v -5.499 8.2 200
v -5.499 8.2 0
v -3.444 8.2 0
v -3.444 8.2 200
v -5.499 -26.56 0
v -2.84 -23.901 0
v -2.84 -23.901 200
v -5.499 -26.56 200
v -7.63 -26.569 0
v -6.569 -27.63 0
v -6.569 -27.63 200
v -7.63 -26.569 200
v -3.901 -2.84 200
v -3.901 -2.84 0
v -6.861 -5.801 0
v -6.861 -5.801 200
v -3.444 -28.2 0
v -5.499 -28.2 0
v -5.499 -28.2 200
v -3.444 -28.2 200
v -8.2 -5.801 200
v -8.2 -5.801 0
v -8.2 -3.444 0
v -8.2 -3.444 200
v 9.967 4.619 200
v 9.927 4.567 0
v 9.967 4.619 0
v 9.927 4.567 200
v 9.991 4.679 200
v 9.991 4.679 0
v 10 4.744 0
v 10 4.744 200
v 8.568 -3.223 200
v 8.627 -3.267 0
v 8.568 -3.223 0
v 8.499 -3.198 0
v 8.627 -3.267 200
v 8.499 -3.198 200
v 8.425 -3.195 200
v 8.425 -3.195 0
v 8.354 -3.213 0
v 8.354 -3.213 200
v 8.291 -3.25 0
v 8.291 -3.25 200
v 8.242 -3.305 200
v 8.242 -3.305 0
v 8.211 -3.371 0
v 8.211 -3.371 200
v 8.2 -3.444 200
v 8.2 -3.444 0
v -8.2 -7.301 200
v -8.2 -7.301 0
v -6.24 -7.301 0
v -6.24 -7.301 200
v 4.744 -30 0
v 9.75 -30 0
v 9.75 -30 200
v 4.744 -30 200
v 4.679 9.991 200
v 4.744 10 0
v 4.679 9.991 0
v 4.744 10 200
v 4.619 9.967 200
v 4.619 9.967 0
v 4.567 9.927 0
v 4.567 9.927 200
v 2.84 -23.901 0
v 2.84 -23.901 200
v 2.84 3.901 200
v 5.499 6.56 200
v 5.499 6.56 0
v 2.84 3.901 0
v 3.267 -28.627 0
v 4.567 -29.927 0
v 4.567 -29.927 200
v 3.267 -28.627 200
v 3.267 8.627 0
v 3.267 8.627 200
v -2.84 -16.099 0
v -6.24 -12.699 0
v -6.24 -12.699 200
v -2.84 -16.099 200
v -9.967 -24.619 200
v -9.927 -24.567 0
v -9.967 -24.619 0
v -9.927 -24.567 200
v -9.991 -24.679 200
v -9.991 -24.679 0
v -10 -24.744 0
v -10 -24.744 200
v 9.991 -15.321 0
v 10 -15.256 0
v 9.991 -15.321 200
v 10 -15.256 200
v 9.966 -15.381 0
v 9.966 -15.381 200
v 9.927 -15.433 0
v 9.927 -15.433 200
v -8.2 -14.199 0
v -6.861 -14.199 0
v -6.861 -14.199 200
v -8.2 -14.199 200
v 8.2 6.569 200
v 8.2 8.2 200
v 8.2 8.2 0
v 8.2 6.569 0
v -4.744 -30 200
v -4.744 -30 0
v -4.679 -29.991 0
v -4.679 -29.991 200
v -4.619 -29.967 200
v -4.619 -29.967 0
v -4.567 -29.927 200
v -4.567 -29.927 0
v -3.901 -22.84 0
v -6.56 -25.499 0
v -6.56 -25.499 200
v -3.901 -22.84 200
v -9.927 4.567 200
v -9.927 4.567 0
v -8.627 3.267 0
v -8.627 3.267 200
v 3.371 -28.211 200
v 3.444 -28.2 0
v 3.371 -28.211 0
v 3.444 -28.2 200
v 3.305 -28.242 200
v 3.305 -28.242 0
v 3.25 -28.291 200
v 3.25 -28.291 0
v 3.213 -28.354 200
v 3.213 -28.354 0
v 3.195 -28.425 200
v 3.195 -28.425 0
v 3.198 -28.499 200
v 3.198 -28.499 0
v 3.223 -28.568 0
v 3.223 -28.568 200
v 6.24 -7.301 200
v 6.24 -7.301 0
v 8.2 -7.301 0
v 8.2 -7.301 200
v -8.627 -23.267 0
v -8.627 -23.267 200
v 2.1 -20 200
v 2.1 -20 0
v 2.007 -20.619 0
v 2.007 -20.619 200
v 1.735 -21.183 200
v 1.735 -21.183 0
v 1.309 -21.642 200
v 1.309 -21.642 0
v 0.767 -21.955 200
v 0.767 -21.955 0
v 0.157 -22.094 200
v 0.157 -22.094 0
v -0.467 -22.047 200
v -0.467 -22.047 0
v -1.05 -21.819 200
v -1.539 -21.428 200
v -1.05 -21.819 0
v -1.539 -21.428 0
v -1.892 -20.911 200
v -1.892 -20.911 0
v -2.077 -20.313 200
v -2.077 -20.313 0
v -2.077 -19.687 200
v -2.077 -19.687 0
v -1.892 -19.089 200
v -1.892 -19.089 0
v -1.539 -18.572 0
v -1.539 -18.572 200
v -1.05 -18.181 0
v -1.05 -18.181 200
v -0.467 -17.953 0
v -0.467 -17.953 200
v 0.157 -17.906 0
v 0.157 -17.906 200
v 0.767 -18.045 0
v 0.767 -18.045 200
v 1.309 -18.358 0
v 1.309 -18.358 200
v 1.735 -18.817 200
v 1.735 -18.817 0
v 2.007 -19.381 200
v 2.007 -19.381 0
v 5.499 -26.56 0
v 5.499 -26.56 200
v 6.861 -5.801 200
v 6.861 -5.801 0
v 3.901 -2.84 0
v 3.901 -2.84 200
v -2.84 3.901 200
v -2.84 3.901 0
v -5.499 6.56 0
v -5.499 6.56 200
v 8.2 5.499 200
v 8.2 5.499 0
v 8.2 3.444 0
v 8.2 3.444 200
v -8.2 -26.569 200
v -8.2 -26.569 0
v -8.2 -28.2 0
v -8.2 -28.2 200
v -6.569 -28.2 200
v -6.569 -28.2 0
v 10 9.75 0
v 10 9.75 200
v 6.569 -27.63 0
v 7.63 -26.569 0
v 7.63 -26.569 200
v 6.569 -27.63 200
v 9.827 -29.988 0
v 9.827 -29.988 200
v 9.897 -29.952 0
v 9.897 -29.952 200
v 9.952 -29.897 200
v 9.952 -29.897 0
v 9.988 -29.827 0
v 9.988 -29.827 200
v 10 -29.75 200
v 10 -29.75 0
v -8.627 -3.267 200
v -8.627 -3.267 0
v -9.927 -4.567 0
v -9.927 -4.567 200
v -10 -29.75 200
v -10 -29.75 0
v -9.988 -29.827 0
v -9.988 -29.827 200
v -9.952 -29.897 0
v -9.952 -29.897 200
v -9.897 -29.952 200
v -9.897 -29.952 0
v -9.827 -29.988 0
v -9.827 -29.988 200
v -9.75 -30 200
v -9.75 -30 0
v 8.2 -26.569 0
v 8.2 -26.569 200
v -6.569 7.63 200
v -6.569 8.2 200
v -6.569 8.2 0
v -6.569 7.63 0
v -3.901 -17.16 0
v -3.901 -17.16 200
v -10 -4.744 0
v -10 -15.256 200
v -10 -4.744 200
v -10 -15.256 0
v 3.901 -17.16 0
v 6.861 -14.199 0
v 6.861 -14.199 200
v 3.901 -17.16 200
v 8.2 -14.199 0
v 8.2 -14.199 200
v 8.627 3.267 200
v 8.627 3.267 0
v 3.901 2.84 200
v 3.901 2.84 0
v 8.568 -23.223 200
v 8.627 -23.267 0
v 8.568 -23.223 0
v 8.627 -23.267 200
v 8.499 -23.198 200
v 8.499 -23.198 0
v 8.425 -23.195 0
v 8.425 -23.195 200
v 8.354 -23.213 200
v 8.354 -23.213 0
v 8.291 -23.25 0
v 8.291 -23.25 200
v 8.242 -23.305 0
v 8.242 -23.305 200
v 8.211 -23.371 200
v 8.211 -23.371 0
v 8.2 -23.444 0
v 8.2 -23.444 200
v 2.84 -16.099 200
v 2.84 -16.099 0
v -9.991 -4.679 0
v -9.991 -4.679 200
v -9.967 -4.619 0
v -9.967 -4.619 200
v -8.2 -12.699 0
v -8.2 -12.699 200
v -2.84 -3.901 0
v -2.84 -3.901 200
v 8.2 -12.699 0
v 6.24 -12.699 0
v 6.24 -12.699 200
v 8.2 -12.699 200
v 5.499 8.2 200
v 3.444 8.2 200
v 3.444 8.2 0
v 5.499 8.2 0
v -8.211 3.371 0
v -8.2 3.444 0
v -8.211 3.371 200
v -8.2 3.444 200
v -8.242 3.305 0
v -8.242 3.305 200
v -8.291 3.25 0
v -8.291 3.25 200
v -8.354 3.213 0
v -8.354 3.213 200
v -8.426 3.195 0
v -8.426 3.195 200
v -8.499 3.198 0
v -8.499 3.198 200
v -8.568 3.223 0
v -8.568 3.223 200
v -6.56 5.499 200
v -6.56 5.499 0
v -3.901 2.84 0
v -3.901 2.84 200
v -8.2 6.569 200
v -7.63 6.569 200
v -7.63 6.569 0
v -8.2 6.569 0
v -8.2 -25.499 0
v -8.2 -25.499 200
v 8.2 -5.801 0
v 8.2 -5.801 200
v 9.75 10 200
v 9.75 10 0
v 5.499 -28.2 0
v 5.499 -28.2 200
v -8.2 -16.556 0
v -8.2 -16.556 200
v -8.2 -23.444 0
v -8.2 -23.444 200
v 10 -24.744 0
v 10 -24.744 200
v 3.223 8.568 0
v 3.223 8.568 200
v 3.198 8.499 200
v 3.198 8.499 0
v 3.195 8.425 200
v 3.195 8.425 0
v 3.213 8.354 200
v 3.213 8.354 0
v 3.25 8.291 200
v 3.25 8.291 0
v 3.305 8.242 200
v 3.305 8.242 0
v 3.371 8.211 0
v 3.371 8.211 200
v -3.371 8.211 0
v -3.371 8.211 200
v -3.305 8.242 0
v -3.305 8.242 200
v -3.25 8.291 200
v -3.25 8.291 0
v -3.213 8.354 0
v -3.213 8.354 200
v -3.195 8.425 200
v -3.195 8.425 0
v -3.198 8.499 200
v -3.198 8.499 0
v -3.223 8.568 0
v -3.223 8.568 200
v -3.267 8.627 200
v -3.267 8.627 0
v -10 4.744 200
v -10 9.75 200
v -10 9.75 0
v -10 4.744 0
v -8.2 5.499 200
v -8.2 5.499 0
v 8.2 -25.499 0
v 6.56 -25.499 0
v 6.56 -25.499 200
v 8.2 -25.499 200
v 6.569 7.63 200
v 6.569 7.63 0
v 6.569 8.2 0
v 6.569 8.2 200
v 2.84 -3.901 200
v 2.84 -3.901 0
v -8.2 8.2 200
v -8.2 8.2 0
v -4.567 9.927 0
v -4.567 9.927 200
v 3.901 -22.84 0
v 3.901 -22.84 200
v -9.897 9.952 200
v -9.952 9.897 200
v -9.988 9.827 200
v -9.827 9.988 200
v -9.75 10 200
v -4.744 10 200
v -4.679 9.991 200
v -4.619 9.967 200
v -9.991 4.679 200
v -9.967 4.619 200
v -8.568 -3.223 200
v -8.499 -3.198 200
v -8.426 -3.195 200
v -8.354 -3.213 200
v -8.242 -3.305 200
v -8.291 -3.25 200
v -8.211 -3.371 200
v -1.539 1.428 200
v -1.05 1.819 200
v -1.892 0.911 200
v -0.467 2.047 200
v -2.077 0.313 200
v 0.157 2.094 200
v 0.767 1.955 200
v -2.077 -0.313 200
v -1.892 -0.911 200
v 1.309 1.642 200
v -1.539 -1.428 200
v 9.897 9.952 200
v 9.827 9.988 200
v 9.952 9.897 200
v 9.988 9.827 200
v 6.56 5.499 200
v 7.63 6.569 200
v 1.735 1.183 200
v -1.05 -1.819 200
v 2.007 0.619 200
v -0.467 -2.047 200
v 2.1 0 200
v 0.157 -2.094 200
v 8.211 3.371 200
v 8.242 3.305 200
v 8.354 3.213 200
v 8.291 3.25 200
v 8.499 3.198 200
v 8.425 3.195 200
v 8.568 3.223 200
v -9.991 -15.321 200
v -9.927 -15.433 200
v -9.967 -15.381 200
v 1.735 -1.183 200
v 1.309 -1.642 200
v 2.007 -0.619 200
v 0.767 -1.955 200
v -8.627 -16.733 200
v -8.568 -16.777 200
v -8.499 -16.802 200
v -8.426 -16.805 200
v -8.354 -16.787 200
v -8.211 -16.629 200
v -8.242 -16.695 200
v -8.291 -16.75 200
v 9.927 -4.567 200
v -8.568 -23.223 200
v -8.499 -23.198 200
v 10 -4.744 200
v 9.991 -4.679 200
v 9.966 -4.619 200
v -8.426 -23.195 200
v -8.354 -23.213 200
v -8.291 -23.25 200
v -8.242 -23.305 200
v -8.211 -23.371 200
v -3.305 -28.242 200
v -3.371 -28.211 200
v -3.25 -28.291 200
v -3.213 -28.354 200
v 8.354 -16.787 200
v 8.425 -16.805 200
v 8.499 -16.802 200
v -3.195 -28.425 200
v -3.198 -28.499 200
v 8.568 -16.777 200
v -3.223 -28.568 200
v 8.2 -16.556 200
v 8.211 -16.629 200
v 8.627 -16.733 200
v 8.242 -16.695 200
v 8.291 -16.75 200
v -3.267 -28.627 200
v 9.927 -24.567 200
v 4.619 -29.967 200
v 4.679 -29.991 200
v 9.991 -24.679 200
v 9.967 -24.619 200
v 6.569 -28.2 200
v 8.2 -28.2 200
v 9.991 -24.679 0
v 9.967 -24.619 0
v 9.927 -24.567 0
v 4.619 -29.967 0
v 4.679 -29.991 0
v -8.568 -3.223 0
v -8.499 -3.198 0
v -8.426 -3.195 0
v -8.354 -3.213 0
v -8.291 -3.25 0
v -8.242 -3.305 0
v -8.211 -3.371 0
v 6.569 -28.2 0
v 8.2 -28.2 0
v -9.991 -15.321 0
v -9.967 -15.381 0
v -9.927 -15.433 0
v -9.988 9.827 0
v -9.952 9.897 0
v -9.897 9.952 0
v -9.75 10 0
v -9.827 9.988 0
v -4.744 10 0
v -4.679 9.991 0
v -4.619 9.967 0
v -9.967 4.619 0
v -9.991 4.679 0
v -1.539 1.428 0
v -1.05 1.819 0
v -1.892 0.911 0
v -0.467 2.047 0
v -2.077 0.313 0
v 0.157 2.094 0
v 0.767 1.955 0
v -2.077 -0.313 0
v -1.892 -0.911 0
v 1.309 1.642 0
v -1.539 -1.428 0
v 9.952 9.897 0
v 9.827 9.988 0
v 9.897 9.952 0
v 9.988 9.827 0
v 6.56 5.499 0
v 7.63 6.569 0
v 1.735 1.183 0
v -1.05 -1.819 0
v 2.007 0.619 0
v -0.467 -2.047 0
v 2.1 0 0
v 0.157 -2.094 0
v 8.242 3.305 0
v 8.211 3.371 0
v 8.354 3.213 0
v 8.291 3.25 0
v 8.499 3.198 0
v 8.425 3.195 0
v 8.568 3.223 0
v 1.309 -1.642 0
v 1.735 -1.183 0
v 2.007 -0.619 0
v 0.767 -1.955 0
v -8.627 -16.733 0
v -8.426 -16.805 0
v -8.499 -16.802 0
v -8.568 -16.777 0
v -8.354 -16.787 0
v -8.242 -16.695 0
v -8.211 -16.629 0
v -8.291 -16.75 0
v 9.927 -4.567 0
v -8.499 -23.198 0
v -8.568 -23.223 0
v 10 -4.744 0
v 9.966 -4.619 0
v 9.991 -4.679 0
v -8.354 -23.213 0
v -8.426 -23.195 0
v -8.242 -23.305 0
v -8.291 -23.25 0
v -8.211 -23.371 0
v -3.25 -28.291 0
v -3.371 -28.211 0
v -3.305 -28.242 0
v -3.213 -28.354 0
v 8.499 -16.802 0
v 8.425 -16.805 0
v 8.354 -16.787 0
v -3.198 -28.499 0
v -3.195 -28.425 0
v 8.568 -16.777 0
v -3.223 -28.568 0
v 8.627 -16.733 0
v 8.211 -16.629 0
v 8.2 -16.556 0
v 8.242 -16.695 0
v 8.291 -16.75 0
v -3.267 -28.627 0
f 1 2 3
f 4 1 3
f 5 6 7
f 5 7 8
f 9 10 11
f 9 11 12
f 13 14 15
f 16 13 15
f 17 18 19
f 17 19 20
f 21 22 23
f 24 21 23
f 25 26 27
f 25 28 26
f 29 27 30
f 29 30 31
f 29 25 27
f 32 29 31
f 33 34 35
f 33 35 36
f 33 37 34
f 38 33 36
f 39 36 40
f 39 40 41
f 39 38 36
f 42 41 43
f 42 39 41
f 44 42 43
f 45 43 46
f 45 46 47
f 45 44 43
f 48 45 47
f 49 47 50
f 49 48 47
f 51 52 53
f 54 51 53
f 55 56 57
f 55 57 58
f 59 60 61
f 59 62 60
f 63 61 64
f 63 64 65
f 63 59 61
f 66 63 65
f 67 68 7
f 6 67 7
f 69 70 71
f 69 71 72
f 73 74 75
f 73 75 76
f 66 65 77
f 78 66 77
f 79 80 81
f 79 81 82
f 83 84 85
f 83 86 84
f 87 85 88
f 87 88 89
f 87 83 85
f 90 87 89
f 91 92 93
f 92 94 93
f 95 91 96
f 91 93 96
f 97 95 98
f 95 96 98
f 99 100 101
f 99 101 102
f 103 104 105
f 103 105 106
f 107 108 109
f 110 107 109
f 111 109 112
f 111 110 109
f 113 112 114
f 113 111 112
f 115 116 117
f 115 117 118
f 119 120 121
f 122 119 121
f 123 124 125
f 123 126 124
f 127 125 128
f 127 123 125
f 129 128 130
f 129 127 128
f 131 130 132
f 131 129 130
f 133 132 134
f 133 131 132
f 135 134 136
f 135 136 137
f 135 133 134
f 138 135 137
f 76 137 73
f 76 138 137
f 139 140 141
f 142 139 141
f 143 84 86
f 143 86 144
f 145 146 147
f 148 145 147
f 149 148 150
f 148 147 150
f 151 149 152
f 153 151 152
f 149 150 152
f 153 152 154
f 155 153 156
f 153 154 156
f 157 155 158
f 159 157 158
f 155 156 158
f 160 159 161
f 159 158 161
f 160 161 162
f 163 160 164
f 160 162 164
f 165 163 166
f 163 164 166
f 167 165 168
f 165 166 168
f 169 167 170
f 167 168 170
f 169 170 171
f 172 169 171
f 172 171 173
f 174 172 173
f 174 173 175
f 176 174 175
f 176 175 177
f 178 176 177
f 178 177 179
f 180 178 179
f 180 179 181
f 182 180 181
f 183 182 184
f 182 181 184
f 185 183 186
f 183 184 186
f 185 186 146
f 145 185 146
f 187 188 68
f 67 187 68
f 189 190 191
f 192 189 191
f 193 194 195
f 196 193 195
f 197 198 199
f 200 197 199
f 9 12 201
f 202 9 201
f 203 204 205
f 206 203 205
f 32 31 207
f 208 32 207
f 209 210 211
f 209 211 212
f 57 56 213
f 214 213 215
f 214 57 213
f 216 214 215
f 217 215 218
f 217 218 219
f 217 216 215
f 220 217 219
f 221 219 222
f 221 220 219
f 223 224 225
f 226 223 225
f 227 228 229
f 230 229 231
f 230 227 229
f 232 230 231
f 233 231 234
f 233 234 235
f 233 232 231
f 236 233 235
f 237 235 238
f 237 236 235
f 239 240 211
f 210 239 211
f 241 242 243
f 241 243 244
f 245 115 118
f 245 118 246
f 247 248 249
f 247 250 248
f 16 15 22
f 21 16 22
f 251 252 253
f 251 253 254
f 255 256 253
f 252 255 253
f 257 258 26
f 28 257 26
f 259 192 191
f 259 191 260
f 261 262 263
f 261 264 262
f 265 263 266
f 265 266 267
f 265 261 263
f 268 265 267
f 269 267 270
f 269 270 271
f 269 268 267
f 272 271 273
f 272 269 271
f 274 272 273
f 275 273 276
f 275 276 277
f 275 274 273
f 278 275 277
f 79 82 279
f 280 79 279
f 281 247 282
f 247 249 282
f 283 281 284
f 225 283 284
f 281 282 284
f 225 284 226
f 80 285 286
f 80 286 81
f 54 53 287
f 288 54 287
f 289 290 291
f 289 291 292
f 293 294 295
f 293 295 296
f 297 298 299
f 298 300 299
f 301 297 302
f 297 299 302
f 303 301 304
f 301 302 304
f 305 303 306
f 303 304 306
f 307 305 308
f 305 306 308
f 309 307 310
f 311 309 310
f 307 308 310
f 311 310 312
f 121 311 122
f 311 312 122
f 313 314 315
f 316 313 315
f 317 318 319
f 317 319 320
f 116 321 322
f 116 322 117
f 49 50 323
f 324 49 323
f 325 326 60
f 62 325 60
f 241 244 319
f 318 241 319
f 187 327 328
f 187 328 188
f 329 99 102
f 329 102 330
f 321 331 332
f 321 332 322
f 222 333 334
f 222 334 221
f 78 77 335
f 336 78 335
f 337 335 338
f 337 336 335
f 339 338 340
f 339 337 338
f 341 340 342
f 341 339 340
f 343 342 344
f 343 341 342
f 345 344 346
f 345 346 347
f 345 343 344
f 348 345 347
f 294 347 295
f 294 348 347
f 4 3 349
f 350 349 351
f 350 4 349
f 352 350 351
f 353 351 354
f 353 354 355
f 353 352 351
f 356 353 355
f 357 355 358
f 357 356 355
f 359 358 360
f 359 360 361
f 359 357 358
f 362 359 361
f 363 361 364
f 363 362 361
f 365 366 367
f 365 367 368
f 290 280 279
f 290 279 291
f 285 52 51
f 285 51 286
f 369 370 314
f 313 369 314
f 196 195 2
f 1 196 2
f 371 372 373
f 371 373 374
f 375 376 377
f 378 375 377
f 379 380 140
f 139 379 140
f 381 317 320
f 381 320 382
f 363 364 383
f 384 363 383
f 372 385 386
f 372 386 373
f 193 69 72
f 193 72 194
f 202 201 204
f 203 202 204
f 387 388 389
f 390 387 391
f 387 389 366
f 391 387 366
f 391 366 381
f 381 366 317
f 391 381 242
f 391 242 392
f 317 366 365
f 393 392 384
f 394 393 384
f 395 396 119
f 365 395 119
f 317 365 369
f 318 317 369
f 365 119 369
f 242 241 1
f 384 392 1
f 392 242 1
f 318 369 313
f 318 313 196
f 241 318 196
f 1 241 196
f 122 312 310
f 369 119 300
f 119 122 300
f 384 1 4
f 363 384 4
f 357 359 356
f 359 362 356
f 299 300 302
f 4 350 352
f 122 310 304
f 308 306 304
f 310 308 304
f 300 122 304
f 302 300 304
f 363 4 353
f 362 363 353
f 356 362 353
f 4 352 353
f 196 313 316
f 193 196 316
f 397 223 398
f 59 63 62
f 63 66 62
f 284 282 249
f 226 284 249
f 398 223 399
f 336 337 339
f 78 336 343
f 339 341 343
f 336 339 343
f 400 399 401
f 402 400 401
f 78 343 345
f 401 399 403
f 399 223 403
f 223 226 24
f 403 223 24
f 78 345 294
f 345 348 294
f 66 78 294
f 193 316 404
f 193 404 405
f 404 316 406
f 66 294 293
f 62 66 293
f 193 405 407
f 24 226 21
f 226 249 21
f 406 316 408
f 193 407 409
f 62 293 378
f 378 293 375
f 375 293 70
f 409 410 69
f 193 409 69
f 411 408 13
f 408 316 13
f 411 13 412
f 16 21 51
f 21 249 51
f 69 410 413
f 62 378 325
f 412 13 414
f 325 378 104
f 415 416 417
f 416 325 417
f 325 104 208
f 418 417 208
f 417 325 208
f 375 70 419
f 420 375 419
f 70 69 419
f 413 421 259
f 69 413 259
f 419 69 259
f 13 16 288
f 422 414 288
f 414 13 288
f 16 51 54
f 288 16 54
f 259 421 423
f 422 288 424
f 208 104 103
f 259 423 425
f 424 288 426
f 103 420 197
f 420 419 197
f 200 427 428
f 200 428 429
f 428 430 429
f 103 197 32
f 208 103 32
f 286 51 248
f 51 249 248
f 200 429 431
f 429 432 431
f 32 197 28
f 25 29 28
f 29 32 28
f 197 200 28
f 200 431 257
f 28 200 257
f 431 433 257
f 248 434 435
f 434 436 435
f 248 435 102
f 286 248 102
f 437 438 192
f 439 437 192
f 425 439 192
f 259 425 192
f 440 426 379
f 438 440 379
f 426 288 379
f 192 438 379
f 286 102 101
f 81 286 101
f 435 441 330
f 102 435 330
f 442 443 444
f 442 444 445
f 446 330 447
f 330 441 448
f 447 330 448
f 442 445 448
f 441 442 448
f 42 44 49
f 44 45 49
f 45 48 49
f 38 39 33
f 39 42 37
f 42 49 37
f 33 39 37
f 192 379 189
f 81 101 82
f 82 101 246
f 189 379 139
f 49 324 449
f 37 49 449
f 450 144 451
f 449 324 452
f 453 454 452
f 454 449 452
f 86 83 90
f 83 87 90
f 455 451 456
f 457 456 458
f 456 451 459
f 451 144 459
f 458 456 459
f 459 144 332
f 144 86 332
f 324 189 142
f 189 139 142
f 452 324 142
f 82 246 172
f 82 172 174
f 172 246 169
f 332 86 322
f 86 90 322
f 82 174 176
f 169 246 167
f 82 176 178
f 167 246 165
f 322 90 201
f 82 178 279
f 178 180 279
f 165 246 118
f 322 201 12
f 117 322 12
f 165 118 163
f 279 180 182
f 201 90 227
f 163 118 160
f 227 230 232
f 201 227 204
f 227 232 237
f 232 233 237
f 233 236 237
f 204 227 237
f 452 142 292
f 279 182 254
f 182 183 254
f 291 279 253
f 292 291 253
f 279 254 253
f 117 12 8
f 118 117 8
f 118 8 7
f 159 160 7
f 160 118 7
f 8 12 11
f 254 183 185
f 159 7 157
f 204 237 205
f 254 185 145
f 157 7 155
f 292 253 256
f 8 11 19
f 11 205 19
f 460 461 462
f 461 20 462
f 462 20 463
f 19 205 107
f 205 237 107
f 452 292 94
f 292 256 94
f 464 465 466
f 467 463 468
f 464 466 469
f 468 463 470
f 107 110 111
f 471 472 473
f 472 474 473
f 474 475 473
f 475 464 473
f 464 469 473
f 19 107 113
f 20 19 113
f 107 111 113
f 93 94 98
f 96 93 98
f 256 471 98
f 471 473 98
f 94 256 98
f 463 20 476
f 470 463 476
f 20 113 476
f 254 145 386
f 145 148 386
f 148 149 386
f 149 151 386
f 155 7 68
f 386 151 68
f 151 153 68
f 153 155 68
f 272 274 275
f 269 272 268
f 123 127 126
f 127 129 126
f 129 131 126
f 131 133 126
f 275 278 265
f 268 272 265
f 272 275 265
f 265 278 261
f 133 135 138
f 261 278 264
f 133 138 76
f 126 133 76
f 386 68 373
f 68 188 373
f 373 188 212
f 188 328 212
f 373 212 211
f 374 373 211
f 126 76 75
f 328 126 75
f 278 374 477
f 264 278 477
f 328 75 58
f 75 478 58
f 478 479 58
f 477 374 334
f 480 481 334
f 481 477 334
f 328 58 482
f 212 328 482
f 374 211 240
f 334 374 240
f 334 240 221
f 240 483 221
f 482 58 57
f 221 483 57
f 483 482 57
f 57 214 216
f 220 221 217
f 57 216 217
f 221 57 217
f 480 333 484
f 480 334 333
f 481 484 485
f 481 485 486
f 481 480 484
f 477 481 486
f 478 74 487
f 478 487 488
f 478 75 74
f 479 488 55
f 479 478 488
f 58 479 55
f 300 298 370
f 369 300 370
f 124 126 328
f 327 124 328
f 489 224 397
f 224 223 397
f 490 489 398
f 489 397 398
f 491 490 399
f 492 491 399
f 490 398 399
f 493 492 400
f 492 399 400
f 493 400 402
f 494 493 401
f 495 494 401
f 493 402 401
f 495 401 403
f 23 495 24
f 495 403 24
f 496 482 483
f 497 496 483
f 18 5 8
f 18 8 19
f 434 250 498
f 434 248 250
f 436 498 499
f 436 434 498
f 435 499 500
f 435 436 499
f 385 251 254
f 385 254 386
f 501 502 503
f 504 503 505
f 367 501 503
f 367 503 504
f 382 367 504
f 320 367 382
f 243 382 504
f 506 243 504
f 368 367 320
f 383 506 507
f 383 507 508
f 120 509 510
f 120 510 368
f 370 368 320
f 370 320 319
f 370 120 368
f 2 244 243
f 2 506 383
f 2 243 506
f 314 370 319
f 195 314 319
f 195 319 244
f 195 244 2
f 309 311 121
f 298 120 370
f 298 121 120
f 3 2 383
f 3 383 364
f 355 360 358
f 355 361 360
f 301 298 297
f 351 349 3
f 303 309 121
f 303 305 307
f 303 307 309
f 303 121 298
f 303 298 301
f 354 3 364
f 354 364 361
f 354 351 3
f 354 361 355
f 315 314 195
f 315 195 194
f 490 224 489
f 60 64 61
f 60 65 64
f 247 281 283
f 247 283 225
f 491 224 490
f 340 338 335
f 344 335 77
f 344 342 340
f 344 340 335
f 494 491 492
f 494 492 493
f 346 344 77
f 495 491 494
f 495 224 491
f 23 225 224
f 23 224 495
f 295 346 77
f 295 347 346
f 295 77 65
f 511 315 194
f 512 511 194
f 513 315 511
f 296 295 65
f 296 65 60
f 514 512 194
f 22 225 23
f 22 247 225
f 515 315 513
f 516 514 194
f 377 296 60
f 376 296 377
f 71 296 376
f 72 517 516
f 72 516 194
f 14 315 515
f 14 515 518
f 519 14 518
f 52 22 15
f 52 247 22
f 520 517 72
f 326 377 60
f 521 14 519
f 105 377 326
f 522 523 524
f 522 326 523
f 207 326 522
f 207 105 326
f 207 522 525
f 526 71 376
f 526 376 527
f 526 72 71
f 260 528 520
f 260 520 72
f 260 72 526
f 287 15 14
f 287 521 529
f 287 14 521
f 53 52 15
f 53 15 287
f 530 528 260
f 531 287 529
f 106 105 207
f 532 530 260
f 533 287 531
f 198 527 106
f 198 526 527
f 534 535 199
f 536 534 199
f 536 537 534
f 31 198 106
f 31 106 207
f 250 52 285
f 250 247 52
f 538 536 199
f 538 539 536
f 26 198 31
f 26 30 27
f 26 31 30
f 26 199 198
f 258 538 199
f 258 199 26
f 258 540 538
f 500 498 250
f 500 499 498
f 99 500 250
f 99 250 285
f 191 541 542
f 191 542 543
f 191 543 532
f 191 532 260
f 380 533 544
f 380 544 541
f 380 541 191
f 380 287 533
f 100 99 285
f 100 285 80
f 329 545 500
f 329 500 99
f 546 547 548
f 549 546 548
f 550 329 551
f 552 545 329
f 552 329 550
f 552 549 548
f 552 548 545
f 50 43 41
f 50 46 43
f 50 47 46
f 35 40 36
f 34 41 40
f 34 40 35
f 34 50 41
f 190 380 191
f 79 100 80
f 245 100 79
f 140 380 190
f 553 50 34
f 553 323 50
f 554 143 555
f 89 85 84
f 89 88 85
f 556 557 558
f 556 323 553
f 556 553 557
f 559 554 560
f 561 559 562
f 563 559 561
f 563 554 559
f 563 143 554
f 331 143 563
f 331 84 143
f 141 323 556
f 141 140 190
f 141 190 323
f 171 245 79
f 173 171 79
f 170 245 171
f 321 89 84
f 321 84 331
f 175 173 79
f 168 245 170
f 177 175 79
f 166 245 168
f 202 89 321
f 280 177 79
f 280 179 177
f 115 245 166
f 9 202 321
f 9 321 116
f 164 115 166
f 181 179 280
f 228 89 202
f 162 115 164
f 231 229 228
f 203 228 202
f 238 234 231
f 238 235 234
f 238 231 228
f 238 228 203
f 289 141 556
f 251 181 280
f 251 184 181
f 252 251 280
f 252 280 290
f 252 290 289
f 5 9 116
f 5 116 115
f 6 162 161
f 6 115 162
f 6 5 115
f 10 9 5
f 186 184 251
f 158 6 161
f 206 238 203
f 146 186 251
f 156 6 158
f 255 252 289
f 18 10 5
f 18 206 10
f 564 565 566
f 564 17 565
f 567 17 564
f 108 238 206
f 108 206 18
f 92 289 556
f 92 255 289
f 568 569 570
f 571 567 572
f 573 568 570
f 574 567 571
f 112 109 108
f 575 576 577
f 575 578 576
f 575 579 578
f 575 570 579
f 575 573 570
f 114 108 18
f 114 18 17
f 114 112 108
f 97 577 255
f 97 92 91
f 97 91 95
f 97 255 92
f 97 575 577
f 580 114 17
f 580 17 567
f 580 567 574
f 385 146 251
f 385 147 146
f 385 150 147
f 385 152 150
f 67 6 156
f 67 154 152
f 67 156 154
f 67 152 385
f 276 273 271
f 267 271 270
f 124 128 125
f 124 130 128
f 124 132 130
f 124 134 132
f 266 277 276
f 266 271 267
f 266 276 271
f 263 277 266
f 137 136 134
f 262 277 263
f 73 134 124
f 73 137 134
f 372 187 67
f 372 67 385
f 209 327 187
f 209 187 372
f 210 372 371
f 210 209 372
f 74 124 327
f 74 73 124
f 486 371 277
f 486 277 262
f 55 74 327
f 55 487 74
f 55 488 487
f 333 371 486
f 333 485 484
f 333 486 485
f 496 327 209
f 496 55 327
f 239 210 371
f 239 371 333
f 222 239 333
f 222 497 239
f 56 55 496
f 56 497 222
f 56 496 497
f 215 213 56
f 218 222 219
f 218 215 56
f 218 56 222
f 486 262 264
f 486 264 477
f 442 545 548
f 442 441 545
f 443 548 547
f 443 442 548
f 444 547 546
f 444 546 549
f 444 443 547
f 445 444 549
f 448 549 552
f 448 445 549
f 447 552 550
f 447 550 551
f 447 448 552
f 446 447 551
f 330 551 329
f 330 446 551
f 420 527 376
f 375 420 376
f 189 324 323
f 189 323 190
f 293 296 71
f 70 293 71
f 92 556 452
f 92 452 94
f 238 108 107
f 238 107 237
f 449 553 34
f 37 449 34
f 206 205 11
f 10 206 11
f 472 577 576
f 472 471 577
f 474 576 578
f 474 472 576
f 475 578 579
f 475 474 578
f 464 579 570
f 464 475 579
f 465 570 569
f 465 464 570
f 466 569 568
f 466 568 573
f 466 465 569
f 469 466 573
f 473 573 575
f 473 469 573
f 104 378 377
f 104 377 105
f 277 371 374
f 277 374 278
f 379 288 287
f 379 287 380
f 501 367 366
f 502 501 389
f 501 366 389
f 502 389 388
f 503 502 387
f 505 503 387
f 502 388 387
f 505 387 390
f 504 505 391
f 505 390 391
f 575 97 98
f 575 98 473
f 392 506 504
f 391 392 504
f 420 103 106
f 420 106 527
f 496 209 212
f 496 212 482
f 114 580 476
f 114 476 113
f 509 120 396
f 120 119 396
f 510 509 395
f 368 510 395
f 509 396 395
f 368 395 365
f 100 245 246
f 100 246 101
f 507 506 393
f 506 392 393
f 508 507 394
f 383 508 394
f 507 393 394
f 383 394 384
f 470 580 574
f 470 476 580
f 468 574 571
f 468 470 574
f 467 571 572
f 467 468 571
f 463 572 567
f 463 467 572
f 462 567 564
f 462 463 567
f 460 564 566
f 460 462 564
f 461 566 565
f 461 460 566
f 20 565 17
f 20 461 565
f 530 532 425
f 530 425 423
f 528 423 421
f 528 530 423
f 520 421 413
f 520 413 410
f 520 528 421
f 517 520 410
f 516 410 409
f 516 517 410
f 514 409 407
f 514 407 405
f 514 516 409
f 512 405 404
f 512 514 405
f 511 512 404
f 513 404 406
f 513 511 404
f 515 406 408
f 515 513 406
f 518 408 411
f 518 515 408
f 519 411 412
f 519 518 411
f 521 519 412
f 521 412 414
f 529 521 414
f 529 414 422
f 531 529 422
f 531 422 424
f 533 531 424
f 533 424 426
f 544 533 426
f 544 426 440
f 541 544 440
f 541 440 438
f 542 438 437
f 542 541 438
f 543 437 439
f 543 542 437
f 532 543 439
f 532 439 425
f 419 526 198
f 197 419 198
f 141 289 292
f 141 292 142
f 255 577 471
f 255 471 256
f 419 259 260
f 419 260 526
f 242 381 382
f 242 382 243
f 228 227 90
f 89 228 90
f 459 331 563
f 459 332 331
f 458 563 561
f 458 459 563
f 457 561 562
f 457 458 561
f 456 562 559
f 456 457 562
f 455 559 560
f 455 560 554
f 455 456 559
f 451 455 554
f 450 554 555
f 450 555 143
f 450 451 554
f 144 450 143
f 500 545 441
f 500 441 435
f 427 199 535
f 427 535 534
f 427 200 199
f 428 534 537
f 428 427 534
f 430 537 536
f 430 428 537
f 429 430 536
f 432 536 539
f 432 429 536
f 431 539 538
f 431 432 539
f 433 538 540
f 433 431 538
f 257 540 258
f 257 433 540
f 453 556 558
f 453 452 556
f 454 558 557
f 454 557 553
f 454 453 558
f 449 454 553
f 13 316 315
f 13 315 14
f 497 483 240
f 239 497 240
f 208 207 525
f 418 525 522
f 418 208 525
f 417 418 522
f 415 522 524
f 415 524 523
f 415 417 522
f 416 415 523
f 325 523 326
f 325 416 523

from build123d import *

# Parameters (mm, degrees)
SKETCH1_R            = 2.1
BOSS_EXTRUDE2_DEPTH  = 200
CUT_EXTRUDE1_DEPTH   = 201
FILLET1_R            = 0.25
FILLET1_OF_MIRROR1_R = 0.25


with BuildPart() as part:
    # Sketch1 → Boss-Extrude2 (new body)
    with BuildSketch(Plane.XY):
        Polygon((8.199993721, -10), (9.999993721, -10), (9.999993721, -4.63999575), (8.199993721, -2.84), (8.199993721, -5.800653822), (6.861313026, -5.800653822), (3.900652213, -2.84), (3.900652213, 2.84), (6.559993721, 5.499347787), (8.199993721, 5.499347787), (8.199993721, 2.84), (9.999993721, 4.64000425), (9.999993721, 10), (4.63999575, 10), (2.84, 8.2), (5.499325592, 8.2), (5.499325592, 6.56), (2.84, 3.900668129), (-2.84, 3.900668129), (-5.49933815, 6.56), (-5.49933815, 8.2), (-2.84, 8.2), (-4.64000425, 10), (-10.000006279, 10), (-10.000006279, 4.63999575), (-8.200006279, 2.84), (-8.200006279, 5.499347787), (-6.560006279, 5.499347787), (-3.900652213, 2.84), (-3.900652213, -2.84), (-6.861299044, -5.800653822), (-8.200006279, -5.800653822), (-8.200006279, -2.84), (-10.000006279, -4.64000425), (-10.000006279, -10), (-8.200006279, -10), (-8.200006279, -7.300653822), (-6.239977665, -7.300653822), (-2.84, -3.900668129), (2.84, -3.900668129), (6.239993721, -7.300653822), (8.199993721, -7.300653822), align=None)
        Circle(SKETCH1_R, mode=Mode.SUBTRACT)
    boss_extrude2 = extrude(amount=BOSS_EXTRUDE2_DEPTH)

    # Sketch2 → Cut-Extrude1 (cut, through all)
    with BuildSketch(Plane.XY.offset(200)):
        Polygon((-8.200006279, 6.569347787), (-8.200006279, 8.2), (-6.56933815, 8.2), (-6.56933815, 7.630009211), (-7.62999707, 6.569347787), align=None)
        Polygon((8.199993721, 8.2), (8.199993721, 6.569347787), (7.629987016, 6.569347787), (6.569325592, 7.630006706), (6.569325592, 8.2), align=None)
    cut_extrude1 = extrude(amount=-CUT_EXTRUDE1_DEPTH, mode=Mode.SUBTRACT)

    # Fillet1
    fillet1_edges = [part.edges().sort_by_distance(p)[0] for p in [
        (9.999993721, -4.63999575, 100),
        (-10.000006279, -4.64000425, 100),
        (-8.200006279, -2.84, 100),
        (-8.200006279, 2.84, 100),
        (-10.000006279, 4.63999575, 100),
        (-10.000006279, 10, 100),
        (-4.64000425, 10, 100),
        (-2.84, 8.2, 100),
        (2.84, 8.2, 100),
        (4.63999575, 10, 100),
        (9.999993721, 10, 100),
        (9.999993721, 4.64000425, 100),
        (8.199993721, 2.84, 100),
        (8.199993721, -2.84, 100),
    ]]
    fillet(fillet1_edges, radius=FILLET1_R)

    # Mirror1: Boss-Extrude2 across plane
    add(boss_extrude2.mirror(Plane(origin=(0, -10, 0), x_dir=(0, 0, 1), z_dir=(0, -1, 0))))

    # Fillet1 of Mirror1
    fillet1_of_mirror1_edges = [part.edges().sort_by_distance(p)[0] for p in [
        (9.999993721, -15.36000425, 100),
        (-10.000006279, -15.35999575, 100),
        (-8.200006279, -17.16, 100),
        (-8.200006279, -22.84, 100),
        (-10.000006279, -24.63999575, 100),
        (-10.000006279, -30, 100),
        (-4.64000425, -30, 100),
        (-2.84, -28.2, 100),
        (2.84, -28.2, 100),
        (4.63999575, -30, 100),
        (9.999993721, -30, 100),
        (9.999993721, -24.64000425, 100),
        (8.199993721, -22.84, 100),
        (8.199993721, -17.16, 100),
    ]]
    fillet(fillet1_of_mirror1_edges, radius=FILLET1_OF_MIRROR1_R)

    # Mirror2: Cut-Extrude1 across plane
    add(cut_extrude1.mirror(Plane(origin=(0, -10, 0), x_dir=(0, 0, 1), z_dir=(0, -1, 0))), mode=Mode.SUBTRACT)


solid = part.part
